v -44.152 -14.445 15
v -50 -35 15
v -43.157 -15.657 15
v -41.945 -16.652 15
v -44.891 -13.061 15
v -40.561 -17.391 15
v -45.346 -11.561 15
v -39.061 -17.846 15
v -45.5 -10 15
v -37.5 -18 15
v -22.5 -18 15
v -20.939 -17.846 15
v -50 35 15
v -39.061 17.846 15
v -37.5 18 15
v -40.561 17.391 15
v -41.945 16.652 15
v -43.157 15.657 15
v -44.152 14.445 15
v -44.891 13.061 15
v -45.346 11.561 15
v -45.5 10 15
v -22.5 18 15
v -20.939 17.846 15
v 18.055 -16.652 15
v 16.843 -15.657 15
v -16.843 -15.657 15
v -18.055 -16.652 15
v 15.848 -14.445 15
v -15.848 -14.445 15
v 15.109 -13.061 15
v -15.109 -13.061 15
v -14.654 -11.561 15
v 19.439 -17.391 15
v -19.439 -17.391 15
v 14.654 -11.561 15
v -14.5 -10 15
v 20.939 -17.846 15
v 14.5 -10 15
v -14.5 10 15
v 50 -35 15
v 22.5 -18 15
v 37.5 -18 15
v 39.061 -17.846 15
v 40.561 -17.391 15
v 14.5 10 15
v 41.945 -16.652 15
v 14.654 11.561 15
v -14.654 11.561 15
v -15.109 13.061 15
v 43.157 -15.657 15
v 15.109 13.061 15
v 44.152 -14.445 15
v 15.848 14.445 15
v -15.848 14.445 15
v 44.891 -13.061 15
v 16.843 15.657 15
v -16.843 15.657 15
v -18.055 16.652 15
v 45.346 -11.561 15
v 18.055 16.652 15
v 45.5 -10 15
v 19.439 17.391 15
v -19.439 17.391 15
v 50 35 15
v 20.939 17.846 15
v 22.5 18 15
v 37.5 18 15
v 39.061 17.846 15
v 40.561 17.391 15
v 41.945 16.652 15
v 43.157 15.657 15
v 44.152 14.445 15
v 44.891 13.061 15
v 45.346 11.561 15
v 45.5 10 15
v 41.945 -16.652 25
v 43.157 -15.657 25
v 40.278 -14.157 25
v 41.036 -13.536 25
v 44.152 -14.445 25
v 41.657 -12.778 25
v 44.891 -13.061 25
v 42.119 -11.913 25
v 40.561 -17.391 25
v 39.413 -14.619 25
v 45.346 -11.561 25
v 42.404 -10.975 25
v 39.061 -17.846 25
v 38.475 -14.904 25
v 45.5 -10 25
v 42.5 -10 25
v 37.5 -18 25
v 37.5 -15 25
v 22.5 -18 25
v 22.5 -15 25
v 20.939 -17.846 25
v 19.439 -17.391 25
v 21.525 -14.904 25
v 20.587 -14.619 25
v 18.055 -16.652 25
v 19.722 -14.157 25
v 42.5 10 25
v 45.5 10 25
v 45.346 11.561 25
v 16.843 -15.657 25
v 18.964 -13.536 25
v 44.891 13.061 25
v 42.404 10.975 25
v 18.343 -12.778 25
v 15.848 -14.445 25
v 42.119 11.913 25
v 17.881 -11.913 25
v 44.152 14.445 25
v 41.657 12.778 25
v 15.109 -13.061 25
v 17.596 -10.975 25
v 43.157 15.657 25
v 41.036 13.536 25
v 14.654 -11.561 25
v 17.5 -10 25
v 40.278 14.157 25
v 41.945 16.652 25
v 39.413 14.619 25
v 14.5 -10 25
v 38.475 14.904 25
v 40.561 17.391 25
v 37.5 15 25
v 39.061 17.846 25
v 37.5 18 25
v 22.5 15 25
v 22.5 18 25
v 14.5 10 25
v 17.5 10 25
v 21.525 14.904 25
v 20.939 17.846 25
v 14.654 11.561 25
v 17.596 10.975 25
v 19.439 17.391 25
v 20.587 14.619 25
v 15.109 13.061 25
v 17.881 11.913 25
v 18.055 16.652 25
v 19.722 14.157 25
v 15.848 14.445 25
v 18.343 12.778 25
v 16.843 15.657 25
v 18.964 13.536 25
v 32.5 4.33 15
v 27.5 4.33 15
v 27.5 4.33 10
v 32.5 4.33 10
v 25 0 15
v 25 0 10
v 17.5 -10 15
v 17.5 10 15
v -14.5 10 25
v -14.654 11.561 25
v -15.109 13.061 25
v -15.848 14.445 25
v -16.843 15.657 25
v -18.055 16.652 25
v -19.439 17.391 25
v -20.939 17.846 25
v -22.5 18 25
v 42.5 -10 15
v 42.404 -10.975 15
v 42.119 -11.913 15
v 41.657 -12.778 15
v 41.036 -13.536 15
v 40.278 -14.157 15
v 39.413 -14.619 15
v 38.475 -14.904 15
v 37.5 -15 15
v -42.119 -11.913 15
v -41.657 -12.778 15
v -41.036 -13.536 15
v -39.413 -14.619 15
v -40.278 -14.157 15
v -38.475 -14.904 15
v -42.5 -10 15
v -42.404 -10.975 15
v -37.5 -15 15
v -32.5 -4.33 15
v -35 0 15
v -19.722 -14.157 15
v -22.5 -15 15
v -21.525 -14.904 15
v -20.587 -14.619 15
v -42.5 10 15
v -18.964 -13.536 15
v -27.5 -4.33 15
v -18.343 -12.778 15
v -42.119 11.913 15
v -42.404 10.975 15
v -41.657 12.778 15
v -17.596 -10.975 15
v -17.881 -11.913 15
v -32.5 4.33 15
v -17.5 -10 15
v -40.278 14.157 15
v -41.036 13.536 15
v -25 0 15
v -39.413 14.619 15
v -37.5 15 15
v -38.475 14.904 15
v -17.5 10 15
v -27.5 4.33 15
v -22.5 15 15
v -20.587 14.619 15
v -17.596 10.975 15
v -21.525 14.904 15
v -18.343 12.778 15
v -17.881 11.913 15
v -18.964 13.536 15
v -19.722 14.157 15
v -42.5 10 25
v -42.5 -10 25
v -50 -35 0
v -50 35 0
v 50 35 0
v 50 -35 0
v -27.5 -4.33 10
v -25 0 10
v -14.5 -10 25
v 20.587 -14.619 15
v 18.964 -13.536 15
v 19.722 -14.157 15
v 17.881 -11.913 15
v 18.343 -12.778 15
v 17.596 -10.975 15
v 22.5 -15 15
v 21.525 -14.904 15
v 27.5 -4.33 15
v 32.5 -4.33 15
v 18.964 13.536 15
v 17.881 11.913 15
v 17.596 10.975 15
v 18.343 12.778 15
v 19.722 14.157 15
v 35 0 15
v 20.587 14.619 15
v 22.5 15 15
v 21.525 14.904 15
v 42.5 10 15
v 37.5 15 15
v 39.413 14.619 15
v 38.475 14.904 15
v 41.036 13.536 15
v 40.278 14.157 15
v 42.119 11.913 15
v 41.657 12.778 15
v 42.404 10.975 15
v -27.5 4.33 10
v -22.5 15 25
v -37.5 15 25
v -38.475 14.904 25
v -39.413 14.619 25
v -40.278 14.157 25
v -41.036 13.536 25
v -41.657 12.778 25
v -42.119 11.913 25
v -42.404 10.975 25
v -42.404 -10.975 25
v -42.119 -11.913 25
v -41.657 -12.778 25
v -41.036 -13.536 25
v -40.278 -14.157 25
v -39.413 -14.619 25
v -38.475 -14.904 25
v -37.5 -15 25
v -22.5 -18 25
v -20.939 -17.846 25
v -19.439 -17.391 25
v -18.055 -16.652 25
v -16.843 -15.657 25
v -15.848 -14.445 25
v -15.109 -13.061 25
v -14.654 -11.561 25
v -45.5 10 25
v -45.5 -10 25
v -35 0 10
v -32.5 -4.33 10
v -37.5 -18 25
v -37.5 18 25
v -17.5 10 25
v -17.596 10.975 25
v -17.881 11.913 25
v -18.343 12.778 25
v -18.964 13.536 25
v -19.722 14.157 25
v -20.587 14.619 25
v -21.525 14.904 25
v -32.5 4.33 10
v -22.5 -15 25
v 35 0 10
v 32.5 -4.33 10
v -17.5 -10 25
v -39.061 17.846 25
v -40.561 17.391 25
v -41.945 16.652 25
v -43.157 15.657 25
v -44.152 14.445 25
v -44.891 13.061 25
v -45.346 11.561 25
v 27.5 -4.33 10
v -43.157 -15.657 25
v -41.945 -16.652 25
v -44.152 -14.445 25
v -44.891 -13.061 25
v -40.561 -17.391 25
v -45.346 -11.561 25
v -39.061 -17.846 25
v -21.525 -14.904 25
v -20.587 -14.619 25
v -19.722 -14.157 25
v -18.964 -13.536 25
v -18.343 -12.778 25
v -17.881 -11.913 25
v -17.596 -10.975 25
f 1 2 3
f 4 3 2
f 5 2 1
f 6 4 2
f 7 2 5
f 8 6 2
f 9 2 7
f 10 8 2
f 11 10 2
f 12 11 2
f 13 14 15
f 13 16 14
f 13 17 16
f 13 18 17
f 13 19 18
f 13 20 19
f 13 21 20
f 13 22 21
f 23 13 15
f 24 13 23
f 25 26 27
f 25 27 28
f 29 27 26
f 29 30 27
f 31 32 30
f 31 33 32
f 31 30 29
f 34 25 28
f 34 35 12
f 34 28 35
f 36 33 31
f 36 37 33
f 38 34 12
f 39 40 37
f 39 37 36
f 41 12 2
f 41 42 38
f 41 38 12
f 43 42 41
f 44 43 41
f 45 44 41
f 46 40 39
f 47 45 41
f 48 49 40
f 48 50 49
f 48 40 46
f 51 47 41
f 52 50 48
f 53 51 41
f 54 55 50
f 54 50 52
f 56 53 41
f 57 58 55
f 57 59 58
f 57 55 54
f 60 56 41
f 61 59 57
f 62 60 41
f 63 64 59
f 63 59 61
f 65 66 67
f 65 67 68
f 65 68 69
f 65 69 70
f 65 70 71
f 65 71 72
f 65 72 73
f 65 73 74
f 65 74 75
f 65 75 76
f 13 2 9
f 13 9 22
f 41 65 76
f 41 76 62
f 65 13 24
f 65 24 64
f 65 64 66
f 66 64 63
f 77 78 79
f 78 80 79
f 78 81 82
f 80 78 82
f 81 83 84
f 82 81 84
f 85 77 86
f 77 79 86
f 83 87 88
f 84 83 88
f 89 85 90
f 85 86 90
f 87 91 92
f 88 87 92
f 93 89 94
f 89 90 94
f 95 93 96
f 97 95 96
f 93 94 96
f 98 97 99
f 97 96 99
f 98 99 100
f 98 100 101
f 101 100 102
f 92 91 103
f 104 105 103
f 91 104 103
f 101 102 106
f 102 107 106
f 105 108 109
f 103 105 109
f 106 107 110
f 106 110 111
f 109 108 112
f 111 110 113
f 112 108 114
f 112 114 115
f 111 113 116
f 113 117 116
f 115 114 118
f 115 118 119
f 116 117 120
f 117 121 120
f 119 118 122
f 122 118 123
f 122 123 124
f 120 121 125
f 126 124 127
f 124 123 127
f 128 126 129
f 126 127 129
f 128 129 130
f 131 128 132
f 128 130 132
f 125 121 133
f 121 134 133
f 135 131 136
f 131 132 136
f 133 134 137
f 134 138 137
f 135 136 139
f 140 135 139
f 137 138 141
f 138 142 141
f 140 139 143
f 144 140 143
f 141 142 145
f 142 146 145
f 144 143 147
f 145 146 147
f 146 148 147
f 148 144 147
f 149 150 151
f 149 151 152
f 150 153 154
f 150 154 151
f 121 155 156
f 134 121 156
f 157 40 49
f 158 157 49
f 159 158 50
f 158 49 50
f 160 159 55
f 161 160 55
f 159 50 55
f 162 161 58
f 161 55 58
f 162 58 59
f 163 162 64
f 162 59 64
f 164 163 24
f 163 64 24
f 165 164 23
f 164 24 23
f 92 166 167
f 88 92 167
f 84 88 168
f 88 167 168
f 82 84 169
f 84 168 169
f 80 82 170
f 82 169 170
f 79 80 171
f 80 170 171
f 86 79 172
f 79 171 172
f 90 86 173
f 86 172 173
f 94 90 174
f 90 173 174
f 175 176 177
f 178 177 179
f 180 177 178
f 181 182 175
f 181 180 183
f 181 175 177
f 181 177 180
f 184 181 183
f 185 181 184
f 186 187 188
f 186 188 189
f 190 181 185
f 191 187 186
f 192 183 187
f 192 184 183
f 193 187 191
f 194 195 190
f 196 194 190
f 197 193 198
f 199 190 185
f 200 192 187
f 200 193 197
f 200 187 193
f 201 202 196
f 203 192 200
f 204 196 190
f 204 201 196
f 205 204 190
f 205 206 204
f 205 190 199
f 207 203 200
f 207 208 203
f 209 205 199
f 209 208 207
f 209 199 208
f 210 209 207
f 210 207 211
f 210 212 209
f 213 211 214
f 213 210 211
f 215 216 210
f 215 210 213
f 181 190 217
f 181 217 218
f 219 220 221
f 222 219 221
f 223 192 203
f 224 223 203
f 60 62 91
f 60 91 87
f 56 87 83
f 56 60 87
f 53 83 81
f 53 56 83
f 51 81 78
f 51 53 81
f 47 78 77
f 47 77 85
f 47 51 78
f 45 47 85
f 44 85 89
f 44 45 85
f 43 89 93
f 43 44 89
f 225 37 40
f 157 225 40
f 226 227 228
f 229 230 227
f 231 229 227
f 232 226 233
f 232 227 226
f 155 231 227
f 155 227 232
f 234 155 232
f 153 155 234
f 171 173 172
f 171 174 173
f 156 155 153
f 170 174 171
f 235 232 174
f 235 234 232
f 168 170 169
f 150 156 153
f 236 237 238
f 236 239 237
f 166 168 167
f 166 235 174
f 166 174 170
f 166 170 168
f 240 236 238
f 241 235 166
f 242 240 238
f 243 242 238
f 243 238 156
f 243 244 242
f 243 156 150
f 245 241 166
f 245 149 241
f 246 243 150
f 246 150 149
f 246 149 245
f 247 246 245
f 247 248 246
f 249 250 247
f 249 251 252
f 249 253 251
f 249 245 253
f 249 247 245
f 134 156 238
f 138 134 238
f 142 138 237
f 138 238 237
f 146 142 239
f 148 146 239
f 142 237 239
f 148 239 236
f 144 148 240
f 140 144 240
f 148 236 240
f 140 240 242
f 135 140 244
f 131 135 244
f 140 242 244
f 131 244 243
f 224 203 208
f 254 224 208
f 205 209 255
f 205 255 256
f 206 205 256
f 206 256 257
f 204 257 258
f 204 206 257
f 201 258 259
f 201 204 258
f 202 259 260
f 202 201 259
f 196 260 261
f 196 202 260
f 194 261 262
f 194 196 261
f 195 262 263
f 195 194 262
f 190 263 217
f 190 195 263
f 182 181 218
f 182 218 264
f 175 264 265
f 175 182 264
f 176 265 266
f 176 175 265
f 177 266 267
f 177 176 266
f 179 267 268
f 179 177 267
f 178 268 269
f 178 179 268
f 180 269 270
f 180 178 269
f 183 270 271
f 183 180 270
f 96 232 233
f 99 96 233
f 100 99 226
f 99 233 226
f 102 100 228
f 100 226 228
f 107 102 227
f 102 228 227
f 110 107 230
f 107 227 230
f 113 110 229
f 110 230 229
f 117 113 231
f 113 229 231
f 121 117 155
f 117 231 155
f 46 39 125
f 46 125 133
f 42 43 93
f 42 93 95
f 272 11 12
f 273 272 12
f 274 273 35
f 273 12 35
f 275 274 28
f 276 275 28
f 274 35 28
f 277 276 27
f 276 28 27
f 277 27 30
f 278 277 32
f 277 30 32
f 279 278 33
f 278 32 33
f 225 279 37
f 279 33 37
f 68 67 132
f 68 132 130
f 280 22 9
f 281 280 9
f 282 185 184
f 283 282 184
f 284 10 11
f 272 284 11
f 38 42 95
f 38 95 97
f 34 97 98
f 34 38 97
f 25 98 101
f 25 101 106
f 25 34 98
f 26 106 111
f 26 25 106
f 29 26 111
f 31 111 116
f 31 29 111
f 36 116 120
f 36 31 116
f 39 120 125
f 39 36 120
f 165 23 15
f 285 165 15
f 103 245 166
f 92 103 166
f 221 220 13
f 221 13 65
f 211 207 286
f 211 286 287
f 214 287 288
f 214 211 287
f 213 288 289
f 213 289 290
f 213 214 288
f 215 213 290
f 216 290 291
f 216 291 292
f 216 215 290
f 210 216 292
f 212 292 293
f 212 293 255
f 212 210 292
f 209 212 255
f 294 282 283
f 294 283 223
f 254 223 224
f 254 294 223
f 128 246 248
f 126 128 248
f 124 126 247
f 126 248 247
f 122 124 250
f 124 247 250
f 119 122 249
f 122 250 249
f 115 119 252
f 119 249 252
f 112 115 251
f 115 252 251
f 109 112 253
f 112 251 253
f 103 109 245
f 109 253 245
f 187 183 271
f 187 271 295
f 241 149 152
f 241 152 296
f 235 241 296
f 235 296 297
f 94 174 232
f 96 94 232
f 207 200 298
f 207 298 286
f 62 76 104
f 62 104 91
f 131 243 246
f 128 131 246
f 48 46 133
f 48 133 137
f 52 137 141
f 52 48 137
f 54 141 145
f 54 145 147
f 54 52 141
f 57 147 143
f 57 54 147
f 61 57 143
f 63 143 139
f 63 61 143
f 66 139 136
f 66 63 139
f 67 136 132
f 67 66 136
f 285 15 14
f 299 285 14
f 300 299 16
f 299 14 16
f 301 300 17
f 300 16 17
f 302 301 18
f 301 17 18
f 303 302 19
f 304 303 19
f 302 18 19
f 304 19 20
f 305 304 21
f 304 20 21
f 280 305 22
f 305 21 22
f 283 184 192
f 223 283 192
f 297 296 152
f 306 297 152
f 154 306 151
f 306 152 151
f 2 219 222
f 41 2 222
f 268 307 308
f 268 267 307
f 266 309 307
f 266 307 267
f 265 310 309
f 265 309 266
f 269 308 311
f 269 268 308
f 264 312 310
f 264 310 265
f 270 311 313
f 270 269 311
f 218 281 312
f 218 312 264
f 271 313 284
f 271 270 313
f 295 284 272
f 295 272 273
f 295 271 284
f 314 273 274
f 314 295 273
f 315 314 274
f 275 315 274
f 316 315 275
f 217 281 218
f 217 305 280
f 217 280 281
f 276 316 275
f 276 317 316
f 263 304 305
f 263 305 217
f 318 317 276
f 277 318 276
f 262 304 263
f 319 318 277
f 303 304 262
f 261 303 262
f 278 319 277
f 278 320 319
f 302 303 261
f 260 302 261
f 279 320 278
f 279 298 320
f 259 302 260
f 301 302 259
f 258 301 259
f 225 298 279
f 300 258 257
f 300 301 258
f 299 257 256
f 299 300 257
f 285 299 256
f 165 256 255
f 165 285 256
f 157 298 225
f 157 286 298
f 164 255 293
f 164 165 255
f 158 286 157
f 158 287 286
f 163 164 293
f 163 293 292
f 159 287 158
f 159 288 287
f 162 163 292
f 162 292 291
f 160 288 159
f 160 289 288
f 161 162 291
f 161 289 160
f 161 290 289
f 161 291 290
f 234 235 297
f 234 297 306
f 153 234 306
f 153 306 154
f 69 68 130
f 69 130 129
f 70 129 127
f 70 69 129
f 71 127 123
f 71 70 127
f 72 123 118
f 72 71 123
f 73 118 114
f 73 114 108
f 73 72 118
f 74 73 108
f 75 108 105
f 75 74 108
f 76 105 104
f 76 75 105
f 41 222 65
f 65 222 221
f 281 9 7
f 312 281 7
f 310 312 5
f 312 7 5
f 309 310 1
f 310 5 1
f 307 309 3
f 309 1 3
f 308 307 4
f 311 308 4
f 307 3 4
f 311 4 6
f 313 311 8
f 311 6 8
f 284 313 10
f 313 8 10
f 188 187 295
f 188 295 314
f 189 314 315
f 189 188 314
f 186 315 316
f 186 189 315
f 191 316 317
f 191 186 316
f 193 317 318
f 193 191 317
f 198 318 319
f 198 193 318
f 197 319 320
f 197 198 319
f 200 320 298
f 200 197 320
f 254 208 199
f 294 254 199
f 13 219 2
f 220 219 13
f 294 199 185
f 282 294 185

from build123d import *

# Parameters (mm, degrees)
SKETCH_W     = 100
SKETCH_H     = 70
PAD_DEPTH    = 15
PAD001_DEPTH = 10
POCKET_DEPTH = 5


with BuildPart() as part:
    # Sketch → Pad (new body)
    with BuildSketch(Plane.XY):
        Rectangle(SKETCH_W, SKETCH_H)
    extrude(amount=PAD_DEPTH)

    # Sketch001 (on Face6 of Pad) → Pad001 (join)
    with BuildSketch(Plane.XY.offset(15)):
        with BuildLine():
            Line((-37.5, -18), (-22.5, -18))
            ThreePointArc((-22.5, -18), (-16.843146, -15.656854), (-14.5, -10))
            Line((-14.5, -10), (-14.5, 10))
            ThreePointArc((-14.5, 10), (-16.843146, 15.656854), (-22.5, 18))
            Line((-22.5, 18), (-37.5, 18))
            ThreePointArc((-37.5, 18), (-43.156854, 15.656854), (-45.5, 10))
            Line((-45.5, 10), (-45.5, -10))
            ThreePointArc((-45.5, -10), (-43.156854, -15.656854), (-37.5, -18))
        make_face()
        with BuildLine():
            Line((-37.5, -15), (-22.5, -15))
            ThreePointArc((-22.5, -15), (-18.964466, -13.535534), (-17.5, -10))
            Line((-17.5, -10), (-17.5, 10))
            ThreePointArc((-17.5, 10), (-18.964466, 13.535534), (-22.5, 15))
            Line((-22.5, 15), (-37.5, 15))
            ThreePointArc((-37.5, 15), (-41.035534, 13.535534), (-42.5, 10))
            Line((-42.5, 10), (-42.5, -10))
            ThreePointArc((-42.5, -10), (-41.035534, -13.535534), (-37.5, -15))
        make_face(mode=Mode.SUBTRACT)
    pad001 = extrude(amount=PAD001_DEPTH)

    # Sketch002 (on Face5 of Pad001) → Pocket (cut)
    with BuildSketch(Plane.XY.offset(15)):
        Polygon((-25, 0), (-27.5, 4.330127), (-32.5, 4.330127), (-35, 0), (-32.5, -4.330127), (-27.5, -4.330127), align=None)
    pocket = extrude(amount=-POCKET_DEPTH, mode=Mode.SUBTRACT)

    # Mirrored: Pad001, Pocket across Sketch001 V_Axis
    add(pad001.mirror(Plane(origin=(0, 0, 15), x_dir=(0, 0, 1), z_dir=(1, 0, 0))))
    add(pocket.mirror(Plane(origin=(0, 0, 15), x_dir=(0, 0, 1), z_dir=(1, 0, 0))), mode=Mode.SUBTRACT)


solid = part.part
